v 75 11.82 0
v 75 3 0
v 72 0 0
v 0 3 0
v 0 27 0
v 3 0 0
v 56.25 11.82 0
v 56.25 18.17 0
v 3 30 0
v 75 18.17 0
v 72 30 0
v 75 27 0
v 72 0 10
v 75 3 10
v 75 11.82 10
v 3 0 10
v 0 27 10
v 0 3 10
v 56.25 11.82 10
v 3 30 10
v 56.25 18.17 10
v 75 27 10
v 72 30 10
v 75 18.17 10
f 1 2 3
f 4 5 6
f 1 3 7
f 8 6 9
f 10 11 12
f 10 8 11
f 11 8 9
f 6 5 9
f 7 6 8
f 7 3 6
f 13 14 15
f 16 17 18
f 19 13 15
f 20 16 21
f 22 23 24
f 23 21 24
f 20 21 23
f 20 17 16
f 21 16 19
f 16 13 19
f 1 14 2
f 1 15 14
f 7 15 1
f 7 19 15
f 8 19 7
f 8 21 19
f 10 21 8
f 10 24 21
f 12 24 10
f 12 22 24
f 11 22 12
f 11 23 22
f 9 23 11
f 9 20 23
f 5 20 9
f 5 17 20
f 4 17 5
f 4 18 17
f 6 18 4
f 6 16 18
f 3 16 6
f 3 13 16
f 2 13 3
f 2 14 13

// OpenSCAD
$fn = 32;

// ----------------------------------------------------------------------
// C washer: 75 x 30 mm plate with an open slot
// ----------------------------------------------------------------------

// --- parameters (mm) ---
profile_height = 10;      // extrusion height
profile_points = 12;      // points of the closed outline

profile = [[3, 0], [72, 0], [75, 3], [75, 11.82], [56.25, 11.82], [56.25, 18.17], [75, 18.17], [75, 27], [72, 30], [3, 30], [0, 27], [0, 3]];  // single closed polygon, 12 points, counter clockwise

// --- the one profile operation ---
linear_extrude(height = profile_height) polygon(points = profile);
